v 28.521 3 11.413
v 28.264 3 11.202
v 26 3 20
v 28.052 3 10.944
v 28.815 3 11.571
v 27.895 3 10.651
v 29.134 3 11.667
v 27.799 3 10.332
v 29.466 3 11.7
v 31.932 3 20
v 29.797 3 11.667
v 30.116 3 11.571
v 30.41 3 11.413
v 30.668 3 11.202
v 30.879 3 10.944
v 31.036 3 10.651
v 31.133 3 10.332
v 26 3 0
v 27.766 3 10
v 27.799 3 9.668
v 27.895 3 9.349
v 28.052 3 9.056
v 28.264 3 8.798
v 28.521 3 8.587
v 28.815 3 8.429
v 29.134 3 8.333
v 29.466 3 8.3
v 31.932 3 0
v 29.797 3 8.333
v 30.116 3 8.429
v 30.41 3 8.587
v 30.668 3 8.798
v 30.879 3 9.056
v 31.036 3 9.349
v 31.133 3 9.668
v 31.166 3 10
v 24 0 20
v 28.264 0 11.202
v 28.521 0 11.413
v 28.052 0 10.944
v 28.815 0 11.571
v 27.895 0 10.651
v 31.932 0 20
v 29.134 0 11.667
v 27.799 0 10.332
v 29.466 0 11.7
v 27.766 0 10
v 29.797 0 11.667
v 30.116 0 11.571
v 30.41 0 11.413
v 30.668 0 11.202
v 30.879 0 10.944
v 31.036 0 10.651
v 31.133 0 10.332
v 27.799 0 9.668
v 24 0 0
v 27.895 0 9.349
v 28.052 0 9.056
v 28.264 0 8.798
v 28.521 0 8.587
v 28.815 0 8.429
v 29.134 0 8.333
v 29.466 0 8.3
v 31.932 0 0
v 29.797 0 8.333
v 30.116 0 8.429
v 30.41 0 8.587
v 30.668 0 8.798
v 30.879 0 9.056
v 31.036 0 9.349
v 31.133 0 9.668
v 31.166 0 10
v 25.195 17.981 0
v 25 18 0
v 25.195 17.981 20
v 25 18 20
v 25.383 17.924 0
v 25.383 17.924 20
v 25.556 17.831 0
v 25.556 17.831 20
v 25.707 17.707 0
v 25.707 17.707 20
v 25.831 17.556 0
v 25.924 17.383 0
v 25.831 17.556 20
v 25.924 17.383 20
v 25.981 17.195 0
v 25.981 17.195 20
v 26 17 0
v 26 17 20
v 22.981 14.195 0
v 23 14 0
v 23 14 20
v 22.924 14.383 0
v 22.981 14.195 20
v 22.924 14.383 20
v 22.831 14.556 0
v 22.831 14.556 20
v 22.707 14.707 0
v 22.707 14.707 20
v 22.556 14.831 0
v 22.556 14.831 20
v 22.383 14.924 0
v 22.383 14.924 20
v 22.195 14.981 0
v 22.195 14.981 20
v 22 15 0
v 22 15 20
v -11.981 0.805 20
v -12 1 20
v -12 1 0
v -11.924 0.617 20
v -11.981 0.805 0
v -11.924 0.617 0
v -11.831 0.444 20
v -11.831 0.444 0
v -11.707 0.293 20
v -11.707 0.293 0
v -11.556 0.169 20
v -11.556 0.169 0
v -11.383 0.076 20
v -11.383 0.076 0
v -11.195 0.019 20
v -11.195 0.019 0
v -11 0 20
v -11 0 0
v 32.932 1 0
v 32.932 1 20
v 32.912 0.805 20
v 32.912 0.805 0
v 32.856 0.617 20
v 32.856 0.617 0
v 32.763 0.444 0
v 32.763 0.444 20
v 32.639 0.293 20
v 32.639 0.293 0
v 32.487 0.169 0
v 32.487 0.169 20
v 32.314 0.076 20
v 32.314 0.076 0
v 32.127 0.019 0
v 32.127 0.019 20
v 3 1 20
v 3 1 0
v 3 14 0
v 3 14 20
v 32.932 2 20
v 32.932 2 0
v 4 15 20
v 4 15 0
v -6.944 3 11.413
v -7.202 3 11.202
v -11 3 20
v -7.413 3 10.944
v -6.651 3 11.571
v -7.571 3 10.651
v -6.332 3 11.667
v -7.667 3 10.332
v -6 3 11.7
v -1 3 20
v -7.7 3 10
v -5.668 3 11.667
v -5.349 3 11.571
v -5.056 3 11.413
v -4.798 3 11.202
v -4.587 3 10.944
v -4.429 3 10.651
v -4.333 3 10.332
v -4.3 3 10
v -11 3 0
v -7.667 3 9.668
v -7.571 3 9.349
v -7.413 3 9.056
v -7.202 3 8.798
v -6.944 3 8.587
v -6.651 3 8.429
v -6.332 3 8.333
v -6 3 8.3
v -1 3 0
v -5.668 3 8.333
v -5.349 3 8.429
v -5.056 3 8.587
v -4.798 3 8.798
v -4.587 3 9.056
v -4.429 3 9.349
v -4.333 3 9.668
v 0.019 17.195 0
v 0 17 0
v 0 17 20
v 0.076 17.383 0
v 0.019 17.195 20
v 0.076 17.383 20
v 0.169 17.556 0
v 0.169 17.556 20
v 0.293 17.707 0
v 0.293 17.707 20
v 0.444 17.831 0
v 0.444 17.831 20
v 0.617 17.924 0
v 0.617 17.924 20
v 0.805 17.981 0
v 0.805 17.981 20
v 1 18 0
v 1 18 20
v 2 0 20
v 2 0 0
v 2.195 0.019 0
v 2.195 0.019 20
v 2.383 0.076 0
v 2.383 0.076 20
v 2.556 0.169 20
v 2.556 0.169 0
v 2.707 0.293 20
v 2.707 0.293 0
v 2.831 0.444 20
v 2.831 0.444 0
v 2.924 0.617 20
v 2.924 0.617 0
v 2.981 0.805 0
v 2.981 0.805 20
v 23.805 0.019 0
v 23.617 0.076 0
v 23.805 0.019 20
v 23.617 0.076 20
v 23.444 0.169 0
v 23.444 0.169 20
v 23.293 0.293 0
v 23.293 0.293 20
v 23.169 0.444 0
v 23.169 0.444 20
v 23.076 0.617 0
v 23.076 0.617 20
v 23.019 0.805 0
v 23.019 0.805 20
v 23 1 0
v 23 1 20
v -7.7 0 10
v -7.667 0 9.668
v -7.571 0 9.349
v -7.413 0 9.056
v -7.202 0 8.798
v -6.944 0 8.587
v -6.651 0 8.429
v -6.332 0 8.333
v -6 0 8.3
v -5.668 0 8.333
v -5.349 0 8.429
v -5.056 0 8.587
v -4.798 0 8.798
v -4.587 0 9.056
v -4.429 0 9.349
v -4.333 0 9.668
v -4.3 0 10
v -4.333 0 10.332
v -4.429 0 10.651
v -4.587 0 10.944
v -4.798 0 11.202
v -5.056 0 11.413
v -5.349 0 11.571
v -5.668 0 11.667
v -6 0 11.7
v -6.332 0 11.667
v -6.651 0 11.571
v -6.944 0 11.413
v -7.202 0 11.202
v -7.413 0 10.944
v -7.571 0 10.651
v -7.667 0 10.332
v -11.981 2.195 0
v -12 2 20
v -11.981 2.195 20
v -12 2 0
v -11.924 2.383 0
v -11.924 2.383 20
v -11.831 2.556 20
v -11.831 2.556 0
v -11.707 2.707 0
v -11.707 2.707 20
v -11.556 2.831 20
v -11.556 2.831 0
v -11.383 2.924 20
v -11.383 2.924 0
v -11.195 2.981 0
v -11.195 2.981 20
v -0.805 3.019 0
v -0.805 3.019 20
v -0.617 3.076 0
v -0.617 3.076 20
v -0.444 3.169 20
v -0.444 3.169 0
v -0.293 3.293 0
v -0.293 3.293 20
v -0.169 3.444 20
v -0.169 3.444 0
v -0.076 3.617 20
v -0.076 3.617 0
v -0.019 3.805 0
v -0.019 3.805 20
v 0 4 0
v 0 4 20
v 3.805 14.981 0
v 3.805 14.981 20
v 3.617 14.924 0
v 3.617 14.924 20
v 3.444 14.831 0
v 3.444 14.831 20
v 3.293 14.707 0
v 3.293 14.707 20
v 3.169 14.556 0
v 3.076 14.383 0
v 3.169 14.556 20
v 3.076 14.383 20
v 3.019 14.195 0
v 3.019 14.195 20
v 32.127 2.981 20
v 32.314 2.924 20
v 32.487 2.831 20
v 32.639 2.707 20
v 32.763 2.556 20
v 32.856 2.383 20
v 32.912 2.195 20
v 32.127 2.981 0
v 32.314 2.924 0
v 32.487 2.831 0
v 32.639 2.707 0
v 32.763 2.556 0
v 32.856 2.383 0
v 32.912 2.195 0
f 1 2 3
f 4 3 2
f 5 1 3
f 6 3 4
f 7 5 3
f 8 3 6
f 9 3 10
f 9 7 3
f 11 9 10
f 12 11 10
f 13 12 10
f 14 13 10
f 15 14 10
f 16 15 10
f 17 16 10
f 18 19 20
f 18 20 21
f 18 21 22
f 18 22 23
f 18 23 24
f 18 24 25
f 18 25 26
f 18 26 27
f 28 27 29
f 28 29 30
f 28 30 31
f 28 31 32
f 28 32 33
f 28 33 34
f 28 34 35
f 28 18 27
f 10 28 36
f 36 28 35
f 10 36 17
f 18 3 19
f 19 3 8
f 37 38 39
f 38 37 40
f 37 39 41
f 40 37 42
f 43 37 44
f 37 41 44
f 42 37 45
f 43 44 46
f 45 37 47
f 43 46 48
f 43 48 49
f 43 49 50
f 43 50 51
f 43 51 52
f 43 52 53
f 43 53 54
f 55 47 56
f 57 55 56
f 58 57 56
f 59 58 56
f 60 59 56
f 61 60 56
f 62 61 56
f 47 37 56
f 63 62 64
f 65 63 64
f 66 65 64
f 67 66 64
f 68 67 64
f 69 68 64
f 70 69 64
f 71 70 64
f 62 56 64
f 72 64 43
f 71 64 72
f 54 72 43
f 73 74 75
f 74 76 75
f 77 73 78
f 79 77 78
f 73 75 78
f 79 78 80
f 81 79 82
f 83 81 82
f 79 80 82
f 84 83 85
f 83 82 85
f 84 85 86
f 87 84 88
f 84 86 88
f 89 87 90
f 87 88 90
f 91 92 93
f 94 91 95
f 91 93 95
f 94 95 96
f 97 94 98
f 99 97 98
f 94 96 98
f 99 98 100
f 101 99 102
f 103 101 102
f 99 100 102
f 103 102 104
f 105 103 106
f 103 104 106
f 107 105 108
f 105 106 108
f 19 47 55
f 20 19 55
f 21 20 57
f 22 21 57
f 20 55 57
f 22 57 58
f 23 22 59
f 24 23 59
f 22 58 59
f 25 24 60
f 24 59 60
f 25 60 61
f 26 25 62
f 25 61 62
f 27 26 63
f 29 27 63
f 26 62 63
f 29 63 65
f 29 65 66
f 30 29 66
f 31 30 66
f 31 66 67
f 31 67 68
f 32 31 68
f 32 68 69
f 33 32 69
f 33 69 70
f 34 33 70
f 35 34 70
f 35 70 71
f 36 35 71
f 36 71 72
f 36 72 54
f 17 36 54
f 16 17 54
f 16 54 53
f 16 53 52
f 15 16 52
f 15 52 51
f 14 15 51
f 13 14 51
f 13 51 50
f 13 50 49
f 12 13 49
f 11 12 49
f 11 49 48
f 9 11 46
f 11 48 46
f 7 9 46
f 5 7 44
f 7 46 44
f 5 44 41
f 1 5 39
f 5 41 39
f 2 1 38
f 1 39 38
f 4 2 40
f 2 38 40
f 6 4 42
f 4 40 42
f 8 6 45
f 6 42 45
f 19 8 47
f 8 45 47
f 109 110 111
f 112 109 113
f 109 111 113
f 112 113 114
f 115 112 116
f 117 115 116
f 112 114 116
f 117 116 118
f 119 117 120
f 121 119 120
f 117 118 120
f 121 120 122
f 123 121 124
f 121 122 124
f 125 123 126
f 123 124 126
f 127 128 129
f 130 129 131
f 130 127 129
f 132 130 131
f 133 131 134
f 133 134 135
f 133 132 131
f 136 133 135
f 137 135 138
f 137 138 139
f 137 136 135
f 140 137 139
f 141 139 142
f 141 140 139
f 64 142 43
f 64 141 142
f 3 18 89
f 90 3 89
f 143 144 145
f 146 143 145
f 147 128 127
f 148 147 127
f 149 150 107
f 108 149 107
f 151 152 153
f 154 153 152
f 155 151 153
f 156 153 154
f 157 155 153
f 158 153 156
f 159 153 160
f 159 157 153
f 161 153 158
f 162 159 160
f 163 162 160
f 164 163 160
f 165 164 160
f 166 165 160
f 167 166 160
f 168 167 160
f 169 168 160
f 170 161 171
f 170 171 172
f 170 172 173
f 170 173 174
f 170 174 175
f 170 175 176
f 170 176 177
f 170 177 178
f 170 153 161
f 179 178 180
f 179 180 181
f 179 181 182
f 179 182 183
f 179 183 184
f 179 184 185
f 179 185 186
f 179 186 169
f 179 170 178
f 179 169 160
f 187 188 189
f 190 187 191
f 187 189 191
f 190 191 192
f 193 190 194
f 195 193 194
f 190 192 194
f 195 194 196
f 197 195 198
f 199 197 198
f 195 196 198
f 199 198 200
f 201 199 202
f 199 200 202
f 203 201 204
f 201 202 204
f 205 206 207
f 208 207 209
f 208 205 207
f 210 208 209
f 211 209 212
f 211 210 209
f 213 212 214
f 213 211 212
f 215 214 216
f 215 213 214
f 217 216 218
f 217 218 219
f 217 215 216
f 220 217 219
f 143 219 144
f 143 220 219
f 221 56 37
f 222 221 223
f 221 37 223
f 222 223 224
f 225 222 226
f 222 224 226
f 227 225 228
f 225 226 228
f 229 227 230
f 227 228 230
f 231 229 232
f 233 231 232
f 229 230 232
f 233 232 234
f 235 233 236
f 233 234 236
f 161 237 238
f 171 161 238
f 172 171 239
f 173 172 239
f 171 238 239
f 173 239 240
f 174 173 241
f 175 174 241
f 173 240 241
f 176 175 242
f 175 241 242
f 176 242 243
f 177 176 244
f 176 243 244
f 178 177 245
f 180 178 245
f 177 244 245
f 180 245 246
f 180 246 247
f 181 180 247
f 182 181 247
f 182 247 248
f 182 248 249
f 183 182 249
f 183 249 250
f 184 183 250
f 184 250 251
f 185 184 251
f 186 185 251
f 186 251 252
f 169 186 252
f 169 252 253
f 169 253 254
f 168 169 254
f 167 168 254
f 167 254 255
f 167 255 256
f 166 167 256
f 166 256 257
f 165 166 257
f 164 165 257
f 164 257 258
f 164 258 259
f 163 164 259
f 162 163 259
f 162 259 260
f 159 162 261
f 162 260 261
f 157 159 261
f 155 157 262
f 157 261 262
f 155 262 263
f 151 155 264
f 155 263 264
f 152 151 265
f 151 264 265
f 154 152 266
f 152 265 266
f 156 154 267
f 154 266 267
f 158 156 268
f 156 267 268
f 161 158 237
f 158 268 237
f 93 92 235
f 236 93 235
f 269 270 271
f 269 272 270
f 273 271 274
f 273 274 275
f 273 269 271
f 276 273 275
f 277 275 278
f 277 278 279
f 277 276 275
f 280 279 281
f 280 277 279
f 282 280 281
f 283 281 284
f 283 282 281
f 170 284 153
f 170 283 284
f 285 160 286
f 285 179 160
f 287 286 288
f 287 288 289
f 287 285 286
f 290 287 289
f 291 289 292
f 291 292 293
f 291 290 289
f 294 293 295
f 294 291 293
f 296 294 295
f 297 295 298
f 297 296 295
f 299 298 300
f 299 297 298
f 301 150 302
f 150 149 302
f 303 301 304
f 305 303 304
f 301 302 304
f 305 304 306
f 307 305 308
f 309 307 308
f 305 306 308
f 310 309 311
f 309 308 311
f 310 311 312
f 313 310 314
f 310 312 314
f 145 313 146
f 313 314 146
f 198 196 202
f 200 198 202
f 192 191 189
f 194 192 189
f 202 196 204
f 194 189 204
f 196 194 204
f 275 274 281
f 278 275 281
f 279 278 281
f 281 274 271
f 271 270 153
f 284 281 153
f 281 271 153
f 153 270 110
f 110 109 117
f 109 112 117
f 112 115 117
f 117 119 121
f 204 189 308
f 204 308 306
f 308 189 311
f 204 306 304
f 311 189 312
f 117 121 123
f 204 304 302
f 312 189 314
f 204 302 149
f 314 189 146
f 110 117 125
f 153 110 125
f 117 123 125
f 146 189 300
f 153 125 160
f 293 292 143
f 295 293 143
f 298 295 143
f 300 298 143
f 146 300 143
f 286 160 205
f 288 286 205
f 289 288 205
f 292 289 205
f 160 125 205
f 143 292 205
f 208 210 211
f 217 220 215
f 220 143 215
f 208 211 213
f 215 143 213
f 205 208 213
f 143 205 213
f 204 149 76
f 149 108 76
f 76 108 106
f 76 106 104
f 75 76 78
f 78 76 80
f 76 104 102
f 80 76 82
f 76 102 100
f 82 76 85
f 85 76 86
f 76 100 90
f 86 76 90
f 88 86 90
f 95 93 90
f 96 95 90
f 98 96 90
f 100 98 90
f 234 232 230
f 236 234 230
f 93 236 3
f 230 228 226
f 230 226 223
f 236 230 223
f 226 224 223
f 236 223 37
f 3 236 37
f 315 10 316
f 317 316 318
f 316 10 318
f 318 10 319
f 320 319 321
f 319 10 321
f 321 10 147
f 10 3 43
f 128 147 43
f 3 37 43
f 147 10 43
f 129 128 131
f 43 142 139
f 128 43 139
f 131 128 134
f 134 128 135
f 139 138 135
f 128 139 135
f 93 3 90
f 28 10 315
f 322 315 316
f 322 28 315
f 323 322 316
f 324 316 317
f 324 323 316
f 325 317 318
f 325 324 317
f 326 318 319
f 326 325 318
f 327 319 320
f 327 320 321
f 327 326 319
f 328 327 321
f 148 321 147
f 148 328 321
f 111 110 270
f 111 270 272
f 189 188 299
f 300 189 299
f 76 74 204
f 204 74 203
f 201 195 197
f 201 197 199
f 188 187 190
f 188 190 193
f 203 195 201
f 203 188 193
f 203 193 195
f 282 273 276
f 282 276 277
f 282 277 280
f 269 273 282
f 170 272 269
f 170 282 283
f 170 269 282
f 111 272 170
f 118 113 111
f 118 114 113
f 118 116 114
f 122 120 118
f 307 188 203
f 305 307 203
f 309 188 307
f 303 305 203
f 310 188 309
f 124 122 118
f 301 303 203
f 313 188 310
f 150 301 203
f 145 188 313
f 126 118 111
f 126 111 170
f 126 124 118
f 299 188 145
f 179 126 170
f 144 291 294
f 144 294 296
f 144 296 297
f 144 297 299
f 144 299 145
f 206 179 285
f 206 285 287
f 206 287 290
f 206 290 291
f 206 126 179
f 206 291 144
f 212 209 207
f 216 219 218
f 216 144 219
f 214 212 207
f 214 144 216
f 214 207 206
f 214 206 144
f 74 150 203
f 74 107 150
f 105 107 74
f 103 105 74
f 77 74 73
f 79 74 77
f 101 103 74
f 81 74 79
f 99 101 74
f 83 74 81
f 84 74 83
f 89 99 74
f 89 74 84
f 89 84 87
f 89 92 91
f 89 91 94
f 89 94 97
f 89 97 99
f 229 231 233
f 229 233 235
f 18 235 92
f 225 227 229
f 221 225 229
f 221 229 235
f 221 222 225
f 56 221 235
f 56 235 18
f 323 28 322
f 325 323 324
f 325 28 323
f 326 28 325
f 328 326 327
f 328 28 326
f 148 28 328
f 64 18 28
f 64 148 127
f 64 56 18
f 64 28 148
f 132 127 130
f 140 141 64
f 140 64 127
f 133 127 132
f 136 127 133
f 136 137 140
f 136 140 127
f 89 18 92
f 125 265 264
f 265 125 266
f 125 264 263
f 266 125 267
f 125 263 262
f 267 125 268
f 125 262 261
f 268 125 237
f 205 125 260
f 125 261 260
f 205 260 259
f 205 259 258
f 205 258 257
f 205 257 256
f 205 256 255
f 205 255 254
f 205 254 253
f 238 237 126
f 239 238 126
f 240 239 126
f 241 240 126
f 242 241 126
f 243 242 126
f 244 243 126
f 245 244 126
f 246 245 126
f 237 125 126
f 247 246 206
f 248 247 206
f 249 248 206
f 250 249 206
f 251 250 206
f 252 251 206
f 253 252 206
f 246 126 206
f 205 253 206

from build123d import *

# Parameters (mm, degrees)
BOSS_EXTRUDE1_DEPTH  = 20
SKETCH7_W            = 12
SKETCH7_H            = 20
SKETCH7_W_2          = 6.931673433
BOSS_EXTRUDE2_DEPTH  = 3
M3_CLEARANCE_HOLE2_D = 3.4
FILLET1_R            = 1


with BuildPart() as part:
    # Sketch3 → Boss-Extrude1 (new body)
    with BuildSketch(Plane.XY):
        Polygon((3, 0), (3, 15), (23, 15), (23, 0), (26, 0), (26, 18), (0, 18), (0, 0), align=None)
    extrude(amount=BOSS_EXTRUDE1_DEPTH)

    # Sketch7 → Boss-Extrude2 (add)
    with BuildSketch(Plane(origin=(0, 0, 0), x_dir=(1, 0, 0), z_dir=(0, 1, 0))):
        with Locations((-6, -10)):
            Rectangle(SKETCH7_W, SKETCH7_H)
        with Locations((29.465836717, -10)):
            Rectangle(SKETCH7_W_2, SKETCH7_H)
    extrude(amount=BOSS_EXTRUDE2_DEPTH)

    # M3 Clearance Hole2 (through all)
    with Locations(Plane(origin=(0, 3, 0), x_dir=(1, 0, 0), z_dir=(0, 1, 0))):
        with Locations((29.465836717, -10), (-6, -10)):
            Hole(M3_CLEARANCE_HOLE2_D / 2)

    # Fillet1
    fillet1_edges = [part.edges().sort_by_distance(p)[0] for p in [
        (0, 18, 10),
        (26, 18, 10),
        (23, 0, 10),
        (23, 15, 10),
        (3, 15, 10),
        (3, 0, 10),
        (32.931673433, 0, 10),
        (32.931673433, 3, 10),
        (-12, 0, 10),
        (0, 3, 10),
        (-12, 3, 10),
    ]]
    fillet(fillet1_edges, radius=FILLET1_R)


solid = part.part
